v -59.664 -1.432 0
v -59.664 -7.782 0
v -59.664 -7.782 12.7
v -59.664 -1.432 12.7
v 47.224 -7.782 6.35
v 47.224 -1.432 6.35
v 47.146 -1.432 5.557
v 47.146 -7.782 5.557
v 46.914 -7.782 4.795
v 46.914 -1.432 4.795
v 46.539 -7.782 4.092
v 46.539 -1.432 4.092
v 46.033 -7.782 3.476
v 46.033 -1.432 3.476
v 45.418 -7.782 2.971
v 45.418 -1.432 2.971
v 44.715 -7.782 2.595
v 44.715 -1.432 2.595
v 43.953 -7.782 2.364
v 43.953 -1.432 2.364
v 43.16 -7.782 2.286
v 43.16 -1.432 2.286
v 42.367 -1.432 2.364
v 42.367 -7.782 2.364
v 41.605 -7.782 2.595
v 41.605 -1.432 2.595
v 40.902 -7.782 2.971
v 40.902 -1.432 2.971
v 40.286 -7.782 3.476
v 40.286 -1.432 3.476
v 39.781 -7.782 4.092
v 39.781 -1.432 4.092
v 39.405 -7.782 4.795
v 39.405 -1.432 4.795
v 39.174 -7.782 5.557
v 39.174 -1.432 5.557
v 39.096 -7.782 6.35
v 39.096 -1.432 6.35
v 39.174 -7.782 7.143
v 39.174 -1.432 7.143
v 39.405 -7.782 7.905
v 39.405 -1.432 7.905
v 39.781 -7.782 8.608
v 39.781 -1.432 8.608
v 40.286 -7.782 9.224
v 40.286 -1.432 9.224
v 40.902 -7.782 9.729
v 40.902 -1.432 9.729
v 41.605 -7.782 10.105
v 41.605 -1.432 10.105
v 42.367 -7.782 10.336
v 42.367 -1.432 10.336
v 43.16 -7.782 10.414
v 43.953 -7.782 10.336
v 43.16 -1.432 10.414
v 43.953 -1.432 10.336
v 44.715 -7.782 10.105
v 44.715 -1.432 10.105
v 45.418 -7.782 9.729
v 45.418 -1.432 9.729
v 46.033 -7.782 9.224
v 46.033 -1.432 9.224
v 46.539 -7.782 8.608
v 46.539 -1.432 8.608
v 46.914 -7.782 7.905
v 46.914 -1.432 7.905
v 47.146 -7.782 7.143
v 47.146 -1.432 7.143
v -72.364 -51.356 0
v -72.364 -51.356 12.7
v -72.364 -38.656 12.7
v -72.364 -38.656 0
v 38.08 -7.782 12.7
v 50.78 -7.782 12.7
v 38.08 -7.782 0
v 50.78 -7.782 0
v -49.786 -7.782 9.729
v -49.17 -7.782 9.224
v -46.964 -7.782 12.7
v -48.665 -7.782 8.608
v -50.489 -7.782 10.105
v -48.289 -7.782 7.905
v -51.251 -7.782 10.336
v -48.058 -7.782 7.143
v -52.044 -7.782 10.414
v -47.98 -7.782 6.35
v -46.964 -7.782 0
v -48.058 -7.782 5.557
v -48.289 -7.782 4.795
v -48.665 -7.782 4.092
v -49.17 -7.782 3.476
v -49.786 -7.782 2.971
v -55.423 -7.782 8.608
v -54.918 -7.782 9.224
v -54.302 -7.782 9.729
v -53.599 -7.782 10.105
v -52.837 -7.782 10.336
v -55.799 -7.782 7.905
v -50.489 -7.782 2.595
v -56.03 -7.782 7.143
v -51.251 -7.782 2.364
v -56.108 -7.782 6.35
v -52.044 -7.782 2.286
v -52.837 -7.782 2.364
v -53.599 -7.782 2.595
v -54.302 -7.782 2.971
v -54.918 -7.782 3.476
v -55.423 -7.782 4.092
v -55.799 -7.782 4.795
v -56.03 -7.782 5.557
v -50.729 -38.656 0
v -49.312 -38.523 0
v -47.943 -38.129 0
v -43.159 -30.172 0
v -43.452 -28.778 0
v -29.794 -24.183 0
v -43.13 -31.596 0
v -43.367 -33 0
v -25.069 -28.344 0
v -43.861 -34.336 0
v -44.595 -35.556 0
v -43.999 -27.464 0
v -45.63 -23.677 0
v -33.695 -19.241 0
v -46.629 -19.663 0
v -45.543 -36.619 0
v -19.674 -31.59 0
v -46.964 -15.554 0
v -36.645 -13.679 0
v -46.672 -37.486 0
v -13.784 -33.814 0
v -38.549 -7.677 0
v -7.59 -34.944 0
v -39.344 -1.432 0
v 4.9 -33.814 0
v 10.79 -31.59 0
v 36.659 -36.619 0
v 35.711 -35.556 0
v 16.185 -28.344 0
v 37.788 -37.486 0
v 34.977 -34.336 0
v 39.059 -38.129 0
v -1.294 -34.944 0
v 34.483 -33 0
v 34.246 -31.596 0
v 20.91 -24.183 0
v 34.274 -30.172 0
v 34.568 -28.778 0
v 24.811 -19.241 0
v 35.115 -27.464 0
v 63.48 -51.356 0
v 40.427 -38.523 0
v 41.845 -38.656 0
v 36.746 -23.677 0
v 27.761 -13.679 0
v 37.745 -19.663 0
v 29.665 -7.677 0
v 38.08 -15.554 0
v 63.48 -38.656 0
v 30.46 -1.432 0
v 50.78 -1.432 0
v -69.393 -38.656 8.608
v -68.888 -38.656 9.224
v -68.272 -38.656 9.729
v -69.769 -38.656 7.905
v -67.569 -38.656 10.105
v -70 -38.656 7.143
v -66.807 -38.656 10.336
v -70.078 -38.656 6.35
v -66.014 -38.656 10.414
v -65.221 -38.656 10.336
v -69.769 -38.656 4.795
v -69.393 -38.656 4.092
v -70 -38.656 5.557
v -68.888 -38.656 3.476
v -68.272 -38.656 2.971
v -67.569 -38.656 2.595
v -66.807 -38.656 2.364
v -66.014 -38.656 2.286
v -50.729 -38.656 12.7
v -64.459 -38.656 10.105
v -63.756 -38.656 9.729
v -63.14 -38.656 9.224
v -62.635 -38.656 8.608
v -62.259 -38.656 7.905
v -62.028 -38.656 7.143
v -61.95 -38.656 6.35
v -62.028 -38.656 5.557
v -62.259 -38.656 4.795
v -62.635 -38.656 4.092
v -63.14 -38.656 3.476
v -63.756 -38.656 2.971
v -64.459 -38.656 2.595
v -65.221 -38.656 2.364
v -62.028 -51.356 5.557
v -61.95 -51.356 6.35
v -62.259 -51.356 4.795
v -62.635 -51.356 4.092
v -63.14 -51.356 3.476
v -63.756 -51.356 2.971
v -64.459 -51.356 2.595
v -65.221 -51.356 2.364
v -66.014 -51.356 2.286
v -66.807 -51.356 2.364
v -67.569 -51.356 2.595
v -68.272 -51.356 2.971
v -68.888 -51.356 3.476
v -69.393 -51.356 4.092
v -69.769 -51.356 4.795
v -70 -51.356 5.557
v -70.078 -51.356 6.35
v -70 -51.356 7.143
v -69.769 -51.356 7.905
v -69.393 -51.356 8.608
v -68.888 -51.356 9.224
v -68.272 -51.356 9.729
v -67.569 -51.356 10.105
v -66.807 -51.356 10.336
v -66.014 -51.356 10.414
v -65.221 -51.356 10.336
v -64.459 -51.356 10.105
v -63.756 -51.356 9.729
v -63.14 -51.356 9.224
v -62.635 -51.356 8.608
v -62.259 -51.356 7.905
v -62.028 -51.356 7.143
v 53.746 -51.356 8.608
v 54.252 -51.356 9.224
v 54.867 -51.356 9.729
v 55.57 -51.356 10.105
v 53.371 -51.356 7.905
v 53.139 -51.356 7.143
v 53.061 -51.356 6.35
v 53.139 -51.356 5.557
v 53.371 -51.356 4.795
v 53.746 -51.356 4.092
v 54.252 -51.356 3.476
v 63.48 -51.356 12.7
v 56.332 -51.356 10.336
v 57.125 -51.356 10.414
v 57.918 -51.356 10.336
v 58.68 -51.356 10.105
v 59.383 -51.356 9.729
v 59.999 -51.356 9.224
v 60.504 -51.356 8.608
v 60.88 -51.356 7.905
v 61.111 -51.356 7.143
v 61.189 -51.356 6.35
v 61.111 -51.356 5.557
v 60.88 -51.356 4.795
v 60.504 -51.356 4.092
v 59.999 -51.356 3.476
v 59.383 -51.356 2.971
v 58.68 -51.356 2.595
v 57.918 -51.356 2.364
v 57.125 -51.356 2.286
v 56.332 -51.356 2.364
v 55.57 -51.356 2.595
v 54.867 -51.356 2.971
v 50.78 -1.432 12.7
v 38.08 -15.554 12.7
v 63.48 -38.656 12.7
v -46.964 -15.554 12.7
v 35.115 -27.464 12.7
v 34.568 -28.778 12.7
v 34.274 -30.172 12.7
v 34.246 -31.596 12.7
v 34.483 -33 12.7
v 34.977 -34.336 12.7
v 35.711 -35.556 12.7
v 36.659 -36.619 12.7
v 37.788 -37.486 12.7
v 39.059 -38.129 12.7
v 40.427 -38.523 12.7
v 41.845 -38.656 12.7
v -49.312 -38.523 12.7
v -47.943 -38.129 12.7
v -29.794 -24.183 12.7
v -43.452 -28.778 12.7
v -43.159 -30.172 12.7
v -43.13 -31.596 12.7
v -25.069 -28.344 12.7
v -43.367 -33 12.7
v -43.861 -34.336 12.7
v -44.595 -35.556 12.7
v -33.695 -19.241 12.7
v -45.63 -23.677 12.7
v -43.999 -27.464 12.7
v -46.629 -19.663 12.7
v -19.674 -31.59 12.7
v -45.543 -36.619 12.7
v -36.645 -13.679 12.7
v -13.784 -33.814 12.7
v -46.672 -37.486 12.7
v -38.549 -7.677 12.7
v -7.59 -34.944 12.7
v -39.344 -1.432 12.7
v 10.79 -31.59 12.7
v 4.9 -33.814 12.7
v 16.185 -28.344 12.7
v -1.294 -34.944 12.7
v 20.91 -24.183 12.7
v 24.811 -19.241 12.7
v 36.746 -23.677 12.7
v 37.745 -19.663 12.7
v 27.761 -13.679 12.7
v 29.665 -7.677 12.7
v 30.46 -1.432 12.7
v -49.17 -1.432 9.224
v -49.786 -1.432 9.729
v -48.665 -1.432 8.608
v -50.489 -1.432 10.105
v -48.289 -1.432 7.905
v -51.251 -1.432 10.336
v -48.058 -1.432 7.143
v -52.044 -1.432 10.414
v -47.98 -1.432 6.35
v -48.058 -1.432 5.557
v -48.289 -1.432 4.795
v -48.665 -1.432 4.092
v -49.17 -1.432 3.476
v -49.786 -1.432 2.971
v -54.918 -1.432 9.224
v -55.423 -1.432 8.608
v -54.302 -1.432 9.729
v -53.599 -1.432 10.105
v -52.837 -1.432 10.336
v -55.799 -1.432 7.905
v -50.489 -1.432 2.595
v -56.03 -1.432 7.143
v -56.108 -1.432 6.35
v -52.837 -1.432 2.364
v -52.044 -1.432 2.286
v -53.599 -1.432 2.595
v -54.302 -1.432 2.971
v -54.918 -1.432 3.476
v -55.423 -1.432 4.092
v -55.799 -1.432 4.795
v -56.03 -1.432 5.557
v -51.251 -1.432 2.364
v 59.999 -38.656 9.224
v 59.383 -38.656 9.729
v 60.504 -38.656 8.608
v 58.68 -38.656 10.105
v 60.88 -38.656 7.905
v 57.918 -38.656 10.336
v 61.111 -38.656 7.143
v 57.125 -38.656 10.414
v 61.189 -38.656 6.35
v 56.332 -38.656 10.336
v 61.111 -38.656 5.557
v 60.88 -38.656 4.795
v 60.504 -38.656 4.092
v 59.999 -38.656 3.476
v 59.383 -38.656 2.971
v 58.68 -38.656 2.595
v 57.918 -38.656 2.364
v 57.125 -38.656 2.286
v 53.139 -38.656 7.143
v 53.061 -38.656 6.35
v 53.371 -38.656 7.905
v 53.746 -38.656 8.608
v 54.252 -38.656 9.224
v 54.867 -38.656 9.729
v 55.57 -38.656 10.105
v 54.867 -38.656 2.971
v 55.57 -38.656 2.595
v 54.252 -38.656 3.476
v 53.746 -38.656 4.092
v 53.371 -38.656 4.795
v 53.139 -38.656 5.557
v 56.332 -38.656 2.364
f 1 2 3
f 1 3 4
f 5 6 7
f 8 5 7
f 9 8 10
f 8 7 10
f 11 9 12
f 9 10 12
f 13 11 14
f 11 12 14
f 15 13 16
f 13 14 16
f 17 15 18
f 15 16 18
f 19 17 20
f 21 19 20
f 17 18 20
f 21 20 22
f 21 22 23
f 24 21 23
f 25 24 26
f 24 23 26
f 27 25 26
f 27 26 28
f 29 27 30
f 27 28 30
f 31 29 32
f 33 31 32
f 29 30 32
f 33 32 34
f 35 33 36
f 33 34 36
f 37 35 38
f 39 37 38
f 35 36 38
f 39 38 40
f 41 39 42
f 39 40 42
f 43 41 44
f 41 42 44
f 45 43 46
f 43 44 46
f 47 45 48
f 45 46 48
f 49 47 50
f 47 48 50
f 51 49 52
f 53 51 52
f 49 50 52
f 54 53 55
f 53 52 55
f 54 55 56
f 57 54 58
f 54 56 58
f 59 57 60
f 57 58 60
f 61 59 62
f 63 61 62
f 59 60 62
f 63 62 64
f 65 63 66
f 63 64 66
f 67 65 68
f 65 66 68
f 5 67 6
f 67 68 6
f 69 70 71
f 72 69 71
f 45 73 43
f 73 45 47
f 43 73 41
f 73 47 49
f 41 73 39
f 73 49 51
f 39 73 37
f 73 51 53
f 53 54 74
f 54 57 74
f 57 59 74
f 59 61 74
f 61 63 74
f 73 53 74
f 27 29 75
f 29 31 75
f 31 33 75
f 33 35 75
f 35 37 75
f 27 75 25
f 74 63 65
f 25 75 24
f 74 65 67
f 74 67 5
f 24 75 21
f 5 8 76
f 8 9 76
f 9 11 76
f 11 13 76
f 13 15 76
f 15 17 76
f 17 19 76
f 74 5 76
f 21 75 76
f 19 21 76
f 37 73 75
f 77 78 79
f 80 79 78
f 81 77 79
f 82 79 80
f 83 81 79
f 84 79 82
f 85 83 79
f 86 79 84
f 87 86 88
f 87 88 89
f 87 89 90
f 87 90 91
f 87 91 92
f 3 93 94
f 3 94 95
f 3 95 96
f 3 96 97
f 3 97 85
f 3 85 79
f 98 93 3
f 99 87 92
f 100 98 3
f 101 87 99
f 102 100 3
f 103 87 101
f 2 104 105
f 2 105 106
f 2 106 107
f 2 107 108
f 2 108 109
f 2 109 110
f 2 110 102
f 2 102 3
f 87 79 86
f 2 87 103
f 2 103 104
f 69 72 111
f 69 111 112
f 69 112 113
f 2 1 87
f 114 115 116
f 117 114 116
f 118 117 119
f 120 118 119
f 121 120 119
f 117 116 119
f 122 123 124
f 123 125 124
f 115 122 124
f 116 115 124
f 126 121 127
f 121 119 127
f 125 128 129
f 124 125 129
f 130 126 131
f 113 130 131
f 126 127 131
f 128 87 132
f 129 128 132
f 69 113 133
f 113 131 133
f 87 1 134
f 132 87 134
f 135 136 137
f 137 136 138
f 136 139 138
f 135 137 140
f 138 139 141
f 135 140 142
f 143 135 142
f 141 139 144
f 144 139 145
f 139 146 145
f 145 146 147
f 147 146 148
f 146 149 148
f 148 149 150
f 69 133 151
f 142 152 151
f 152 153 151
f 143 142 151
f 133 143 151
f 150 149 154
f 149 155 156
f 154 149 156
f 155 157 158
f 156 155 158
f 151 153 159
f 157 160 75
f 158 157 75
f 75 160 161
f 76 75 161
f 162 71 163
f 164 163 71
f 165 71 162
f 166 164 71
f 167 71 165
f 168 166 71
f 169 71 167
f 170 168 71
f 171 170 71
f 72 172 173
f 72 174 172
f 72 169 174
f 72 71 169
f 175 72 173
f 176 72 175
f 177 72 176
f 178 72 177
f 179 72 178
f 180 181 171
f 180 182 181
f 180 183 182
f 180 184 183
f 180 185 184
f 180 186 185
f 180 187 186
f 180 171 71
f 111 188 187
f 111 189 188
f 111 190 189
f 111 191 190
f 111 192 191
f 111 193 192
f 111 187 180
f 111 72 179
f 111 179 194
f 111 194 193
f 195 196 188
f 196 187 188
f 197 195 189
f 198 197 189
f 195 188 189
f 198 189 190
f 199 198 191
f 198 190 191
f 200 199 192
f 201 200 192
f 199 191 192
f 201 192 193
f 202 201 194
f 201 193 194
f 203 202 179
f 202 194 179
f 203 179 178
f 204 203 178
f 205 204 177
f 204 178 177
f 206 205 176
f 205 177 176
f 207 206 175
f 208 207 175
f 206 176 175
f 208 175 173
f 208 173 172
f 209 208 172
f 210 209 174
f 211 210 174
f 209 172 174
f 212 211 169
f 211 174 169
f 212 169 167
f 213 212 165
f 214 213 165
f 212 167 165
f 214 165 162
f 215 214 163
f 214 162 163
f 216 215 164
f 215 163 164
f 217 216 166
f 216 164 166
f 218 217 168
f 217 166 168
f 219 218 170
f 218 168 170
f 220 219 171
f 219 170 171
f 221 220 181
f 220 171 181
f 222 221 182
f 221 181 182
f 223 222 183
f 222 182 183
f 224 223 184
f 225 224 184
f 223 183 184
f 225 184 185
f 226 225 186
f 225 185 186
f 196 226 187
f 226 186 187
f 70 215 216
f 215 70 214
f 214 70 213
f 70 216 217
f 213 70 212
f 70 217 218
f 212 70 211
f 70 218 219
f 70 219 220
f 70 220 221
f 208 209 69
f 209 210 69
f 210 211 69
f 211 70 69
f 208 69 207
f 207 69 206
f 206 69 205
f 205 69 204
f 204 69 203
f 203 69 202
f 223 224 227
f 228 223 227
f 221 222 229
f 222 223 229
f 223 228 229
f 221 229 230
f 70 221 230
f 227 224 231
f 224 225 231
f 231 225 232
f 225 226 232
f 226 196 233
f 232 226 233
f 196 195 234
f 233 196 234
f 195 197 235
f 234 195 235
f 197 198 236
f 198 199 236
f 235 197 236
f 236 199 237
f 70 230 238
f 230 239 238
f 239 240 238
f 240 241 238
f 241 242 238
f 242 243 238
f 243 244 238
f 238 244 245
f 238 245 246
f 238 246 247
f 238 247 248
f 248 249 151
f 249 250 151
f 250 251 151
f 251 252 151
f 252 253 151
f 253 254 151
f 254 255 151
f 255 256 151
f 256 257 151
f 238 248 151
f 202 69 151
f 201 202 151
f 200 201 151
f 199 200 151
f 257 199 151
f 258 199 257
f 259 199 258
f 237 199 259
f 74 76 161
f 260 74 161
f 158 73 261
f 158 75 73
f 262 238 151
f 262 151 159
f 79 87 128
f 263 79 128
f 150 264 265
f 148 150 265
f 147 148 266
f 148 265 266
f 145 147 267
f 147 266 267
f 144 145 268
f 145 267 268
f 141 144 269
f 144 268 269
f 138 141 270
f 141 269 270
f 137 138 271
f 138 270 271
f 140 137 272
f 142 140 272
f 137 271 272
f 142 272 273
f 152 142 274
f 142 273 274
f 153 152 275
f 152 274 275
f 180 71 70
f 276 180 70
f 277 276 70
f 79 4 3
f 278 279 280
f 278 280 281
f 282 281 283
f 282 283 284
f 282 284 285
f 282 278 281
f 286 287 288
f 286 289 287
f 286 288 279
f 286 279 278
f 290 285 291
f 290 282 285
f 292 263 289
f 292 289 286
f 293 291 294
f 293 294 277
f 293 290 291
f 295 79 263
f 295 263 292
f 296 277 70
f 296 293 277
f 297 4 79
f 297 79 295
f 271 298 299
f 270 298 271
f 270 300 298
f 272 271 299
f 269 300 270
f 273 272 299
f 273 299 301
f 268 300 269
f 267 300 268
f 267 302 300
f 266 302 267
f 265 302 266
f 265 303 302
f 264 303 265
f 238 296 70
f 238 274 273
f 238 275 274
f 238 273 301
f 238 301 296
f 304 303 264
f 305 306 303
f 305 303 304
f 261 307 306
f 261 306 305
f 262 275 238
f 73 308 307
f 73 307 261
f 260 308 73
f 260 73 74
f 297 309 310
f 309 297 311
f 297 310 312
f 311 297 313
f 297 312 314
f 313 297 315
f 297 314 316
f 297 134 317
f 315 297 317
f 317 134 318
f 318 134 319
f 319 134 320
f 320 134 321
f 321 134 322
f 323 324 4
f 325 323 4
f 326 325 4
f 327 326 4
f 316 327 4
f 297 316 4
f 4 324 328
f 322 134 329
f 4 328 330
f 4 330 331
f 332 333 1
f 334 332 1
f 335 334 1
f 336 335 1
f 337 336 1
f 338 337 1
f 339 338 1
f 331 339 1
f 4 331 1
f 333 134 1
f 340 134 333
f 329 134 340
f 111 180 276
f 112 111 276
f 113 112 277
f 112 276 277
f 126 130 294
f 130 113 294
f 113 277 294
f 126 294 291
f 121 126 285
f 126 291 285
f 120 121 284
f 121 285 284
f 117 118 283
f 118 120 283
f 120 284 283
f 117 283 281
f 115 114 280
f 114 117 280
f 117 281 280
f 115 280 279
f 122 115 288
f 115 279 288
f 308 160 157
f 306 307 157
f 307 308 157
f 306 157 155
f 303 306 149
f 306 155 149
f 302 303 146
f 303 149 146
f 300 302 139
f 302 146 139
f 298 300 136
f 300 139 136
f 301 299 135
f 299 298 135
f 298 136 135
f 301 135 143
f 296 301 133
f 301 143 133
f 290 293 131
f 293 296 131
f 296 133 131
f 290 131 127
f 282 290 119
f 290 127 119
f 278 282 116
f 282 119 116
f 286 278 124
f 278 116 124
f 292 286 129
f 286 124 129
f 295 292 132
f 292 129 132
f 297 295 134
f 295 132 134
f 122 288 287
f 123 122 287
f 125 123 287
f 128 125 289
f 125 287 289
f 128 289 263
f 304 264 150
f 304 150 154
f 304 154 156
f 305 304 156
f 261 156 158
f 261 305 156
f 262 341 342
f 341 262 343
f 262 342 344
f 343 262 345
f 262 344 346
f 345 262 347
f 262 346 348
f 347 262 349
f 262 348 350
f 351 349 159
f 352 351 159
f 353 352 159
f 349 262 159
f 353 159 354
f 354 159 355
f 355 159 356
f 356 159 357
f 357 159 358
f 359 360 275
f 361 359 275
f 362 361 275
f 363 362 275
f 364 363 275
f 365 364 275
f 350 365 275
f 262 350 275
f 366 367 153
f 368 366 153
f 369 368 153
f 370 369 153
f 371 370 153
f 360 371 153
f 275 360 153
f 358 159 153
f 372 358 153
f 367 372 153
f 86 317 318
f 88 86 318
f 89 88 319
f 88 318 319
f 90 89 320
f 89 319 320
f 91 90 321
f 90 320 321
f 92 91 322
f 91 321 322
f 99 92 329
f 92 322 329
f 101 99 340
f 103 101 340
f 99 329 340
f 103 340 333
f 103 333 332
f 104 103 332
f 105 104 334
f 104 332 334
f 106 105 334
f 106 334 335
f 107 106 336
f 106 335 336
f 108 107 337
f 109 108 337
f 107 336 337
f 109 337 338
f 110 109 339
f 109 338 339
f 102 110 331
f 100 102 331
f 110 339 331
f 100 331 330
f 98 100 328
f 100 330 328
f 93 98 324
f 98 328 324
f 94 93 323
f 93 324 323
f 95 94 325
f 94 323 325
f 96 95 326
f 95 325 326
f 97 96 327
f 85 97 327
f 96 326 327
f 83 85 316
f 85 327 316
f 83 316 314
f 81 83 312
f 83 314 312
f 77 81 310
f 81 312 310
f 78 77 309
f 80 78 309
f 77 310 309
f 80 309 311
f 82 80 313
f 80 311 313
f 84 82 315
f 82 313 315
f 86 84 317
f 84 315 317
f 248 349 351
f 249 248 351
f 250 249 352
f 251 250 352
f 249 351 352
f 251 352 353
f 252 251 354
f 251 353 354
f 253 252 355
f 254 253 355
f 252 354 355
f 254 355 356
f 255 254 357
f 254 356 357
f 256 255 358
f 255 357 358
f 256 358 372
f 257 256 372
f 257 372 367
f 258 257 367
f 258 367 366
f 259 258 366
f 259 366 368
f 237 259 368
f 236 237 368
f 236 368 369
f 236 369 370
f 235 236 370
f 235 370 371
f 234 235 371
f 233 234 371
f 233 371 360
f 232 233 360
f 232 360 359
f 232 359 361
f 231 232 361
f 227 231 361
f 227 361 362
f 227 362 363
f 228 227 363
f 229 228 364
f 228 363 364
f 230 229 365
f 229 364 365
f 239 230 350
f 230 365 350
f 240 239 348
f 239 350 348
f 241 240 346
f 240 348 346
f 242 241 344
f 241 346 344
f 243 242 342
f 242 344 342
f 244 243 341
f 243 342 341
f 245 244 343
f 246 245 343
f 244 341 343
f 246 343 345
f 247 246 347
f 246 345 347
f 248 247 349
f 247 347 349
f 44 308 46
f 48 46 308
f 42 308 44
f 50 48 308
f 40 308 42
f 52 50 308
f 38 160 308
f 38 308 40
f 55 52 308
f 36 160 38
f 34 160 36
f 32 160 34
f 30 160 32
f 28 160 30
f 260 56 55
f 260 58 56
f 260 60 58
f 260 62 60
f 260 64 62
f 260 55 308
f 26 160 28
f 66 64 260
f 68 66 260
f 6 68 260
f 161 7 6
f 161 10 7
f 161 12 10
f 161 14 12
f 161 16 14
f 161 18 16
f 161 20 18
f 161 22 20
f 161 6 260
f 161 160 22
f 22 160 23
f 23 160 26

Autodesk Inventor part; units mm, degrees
ref_plane "YZ Plane" through (0, 0, 0) normal (1, 0, 0) x (0, 1, 0)
ref_plane "XZ Plane" through (0, 0, 0) normal (0, 1, 0) x (-1, 0, 0)
ref_plane "XY Plane" through (0, 0, 0) normal (0, 0, 1) x (1, 0, 0)
sketch "Sketch1" plane through (0, 0, 0) normal (0, 0, 1) x (1, 0, 0)
  arc A0 (-39.344, -1.4316) -> (30.4598, -1.4316) centre (-4.4421, -0.1616) ccw
  line L0 (-39.344, -1.4316) -> (-39.3671, -1.4316)
  line L1 (-39.344, -1.4316) -> (-52.044, -1.4316)
  line L2 (30.4598, -1.4316) -> (43.1598, -1.4316)
  arc A1 (-46.964, -22.4724) -> (38.0798, -22.4724) centre (-4.4421, -0.1616) ccw
  line L3 (-4.4421, -48.1813) -> (-4.4421, -51.3563)
  line L4 (-4.4421, -51.3563) -> (-72.364, -51.3563)
  line L5 (-4.4421, -51.3563) -> (63.4798, -51.3563)
  line L6 (-52.044, -1.4316) -> (-59.664, -1.4316)
  line L7 (43.1598, -1.4316) -> (50.7798, -1.4316)
  line L8 (30.4598, -1.4316) -> (38.0798, -1.4316)
  line L9 (38.0798, -1.4316) -> (38.0798, -22.4724)
  line L10 (-39.344, -1.4316) -> (-45.694, -1.4316)
  line L11 (-39.344, -1.4316) -> (-46.964, -1.4316)
  line L12 (-46.964, -1.4316) -> (-46.964, -22.4724)
  line L13 (-46.964, -7.7816) -> (-59.664, -7.7816)
  line L14 (-59.664, -7.7816) -> (-59.664, -1.4316)
  line L15 (38.0798, -7.7816) -> (50.7798, -7.7816)
  line L16 (50.7798, -7.7816) -> (50.7798, -1.4316)
  line L17 (-72.364, -51.3563) -> (-72.364, -38.6563)
  line L18 (63.4798, -51.3563) -> (63.4798, -38.6563)
  line L19 (-72.364, -38.6563) -> (-33.1483, -38.6563)
  line L20 (63.4798, -38.6563) -> (24.2642, -38.6563)
  point P0 (0, 0)
  dimension "d0" = 69.85
  dimension "d1" = 12.7
  dimension "d2" = 12.7
  dimension "d3" = 3.175
  dimension "d4" = 7.62
  dimension "d5" = 7.62
  dimension "d6" = 7.62
  dimension "d7" = 7.62
  dimension "d8" = 6.35
  dimension "d9" = 6.35
  dimension "d10" = 12.7
  dimension "d11" = 12.7
  dimension "d12" = 12.7
  dimension "d13" = 12.7
extrude "Extrusion1" add sketch "Sketch1" along normal blind 12.7
fillet "Fillet1" radius 7.62 2 edges at (24.2642, -38.6563, 6.35) (-33.1483, -38.6563, 6.35)
fillet "Fillet2" radius 25.4 2 edges at (-46.964, -22.4724, 6.35) (38.0798, -22.4724, 6.35)
sketch "Sketch2" plane through (-59.664, -1.4316, 0) normal (0, 1, 0) x (1, 0, 0)
  line L0 (20.32, 0) -> (20.32, -12.7) projected
  line L1 (0, 0) -> (20.32, 0)
  circle A0 centre (7.62, -6.35) radius 4.064
  circle A1 centre (102.8238, -6.35) radius 4.064
  line L2 (90.1238, 0) -> (90.1238, -12.7) projected
  line L3 (-12.7, 0) -> (-12.7, -12.7) projected
  line L4 (-12.7, -12.7) -> (0, -12.7)
  line L5 (0, -12.7) -> (0, 0)
  line L6 (0, 0) -> (-12.7, 0)
  line L7 (-12.7, 0) -> (-12.7, -12.7)
  line L8 (110.4438, 0) -> (110.4438, -12.7) projected
  line L9 (-12.7, 0) -> (123.1438, 0) projected
  line L10 (110.4438, -12.7) -> (123.1438, -12.7)
  line L11 (123.1438, -12.7) -> (123.1438, 0)
  line L12 (123.1438, 0) -> (110.4438, 0)
  line L13 (110.4438, 0) -> (110.4438, -12.7)
  circle A2 centre (-6.35, -6.35) radius 4.064
  circle A3 centre (116.7892, -6.35) radius 4.064
  point P0 (59.664, 0)
  dimension "d18" = 12.7
  dimension "d19" = 8.128
  dimension "d20" = 12.7
  dimension "d21" = 8.128
  dimension "d22" = 8.128
  dimension "d23" = 8.128
  dimension "d28" = 123.1392
extrude "Extrusion2" cut sketch "Sketch2" against normal blind 25.4 contours A0 | A1
extrude "Extrusion3" cut sketch "Sketch2" against normal blind 76.2 contours A2 | A3
properties part number "REAL MOTOR MOUNT 2.75 BOTTOM"
